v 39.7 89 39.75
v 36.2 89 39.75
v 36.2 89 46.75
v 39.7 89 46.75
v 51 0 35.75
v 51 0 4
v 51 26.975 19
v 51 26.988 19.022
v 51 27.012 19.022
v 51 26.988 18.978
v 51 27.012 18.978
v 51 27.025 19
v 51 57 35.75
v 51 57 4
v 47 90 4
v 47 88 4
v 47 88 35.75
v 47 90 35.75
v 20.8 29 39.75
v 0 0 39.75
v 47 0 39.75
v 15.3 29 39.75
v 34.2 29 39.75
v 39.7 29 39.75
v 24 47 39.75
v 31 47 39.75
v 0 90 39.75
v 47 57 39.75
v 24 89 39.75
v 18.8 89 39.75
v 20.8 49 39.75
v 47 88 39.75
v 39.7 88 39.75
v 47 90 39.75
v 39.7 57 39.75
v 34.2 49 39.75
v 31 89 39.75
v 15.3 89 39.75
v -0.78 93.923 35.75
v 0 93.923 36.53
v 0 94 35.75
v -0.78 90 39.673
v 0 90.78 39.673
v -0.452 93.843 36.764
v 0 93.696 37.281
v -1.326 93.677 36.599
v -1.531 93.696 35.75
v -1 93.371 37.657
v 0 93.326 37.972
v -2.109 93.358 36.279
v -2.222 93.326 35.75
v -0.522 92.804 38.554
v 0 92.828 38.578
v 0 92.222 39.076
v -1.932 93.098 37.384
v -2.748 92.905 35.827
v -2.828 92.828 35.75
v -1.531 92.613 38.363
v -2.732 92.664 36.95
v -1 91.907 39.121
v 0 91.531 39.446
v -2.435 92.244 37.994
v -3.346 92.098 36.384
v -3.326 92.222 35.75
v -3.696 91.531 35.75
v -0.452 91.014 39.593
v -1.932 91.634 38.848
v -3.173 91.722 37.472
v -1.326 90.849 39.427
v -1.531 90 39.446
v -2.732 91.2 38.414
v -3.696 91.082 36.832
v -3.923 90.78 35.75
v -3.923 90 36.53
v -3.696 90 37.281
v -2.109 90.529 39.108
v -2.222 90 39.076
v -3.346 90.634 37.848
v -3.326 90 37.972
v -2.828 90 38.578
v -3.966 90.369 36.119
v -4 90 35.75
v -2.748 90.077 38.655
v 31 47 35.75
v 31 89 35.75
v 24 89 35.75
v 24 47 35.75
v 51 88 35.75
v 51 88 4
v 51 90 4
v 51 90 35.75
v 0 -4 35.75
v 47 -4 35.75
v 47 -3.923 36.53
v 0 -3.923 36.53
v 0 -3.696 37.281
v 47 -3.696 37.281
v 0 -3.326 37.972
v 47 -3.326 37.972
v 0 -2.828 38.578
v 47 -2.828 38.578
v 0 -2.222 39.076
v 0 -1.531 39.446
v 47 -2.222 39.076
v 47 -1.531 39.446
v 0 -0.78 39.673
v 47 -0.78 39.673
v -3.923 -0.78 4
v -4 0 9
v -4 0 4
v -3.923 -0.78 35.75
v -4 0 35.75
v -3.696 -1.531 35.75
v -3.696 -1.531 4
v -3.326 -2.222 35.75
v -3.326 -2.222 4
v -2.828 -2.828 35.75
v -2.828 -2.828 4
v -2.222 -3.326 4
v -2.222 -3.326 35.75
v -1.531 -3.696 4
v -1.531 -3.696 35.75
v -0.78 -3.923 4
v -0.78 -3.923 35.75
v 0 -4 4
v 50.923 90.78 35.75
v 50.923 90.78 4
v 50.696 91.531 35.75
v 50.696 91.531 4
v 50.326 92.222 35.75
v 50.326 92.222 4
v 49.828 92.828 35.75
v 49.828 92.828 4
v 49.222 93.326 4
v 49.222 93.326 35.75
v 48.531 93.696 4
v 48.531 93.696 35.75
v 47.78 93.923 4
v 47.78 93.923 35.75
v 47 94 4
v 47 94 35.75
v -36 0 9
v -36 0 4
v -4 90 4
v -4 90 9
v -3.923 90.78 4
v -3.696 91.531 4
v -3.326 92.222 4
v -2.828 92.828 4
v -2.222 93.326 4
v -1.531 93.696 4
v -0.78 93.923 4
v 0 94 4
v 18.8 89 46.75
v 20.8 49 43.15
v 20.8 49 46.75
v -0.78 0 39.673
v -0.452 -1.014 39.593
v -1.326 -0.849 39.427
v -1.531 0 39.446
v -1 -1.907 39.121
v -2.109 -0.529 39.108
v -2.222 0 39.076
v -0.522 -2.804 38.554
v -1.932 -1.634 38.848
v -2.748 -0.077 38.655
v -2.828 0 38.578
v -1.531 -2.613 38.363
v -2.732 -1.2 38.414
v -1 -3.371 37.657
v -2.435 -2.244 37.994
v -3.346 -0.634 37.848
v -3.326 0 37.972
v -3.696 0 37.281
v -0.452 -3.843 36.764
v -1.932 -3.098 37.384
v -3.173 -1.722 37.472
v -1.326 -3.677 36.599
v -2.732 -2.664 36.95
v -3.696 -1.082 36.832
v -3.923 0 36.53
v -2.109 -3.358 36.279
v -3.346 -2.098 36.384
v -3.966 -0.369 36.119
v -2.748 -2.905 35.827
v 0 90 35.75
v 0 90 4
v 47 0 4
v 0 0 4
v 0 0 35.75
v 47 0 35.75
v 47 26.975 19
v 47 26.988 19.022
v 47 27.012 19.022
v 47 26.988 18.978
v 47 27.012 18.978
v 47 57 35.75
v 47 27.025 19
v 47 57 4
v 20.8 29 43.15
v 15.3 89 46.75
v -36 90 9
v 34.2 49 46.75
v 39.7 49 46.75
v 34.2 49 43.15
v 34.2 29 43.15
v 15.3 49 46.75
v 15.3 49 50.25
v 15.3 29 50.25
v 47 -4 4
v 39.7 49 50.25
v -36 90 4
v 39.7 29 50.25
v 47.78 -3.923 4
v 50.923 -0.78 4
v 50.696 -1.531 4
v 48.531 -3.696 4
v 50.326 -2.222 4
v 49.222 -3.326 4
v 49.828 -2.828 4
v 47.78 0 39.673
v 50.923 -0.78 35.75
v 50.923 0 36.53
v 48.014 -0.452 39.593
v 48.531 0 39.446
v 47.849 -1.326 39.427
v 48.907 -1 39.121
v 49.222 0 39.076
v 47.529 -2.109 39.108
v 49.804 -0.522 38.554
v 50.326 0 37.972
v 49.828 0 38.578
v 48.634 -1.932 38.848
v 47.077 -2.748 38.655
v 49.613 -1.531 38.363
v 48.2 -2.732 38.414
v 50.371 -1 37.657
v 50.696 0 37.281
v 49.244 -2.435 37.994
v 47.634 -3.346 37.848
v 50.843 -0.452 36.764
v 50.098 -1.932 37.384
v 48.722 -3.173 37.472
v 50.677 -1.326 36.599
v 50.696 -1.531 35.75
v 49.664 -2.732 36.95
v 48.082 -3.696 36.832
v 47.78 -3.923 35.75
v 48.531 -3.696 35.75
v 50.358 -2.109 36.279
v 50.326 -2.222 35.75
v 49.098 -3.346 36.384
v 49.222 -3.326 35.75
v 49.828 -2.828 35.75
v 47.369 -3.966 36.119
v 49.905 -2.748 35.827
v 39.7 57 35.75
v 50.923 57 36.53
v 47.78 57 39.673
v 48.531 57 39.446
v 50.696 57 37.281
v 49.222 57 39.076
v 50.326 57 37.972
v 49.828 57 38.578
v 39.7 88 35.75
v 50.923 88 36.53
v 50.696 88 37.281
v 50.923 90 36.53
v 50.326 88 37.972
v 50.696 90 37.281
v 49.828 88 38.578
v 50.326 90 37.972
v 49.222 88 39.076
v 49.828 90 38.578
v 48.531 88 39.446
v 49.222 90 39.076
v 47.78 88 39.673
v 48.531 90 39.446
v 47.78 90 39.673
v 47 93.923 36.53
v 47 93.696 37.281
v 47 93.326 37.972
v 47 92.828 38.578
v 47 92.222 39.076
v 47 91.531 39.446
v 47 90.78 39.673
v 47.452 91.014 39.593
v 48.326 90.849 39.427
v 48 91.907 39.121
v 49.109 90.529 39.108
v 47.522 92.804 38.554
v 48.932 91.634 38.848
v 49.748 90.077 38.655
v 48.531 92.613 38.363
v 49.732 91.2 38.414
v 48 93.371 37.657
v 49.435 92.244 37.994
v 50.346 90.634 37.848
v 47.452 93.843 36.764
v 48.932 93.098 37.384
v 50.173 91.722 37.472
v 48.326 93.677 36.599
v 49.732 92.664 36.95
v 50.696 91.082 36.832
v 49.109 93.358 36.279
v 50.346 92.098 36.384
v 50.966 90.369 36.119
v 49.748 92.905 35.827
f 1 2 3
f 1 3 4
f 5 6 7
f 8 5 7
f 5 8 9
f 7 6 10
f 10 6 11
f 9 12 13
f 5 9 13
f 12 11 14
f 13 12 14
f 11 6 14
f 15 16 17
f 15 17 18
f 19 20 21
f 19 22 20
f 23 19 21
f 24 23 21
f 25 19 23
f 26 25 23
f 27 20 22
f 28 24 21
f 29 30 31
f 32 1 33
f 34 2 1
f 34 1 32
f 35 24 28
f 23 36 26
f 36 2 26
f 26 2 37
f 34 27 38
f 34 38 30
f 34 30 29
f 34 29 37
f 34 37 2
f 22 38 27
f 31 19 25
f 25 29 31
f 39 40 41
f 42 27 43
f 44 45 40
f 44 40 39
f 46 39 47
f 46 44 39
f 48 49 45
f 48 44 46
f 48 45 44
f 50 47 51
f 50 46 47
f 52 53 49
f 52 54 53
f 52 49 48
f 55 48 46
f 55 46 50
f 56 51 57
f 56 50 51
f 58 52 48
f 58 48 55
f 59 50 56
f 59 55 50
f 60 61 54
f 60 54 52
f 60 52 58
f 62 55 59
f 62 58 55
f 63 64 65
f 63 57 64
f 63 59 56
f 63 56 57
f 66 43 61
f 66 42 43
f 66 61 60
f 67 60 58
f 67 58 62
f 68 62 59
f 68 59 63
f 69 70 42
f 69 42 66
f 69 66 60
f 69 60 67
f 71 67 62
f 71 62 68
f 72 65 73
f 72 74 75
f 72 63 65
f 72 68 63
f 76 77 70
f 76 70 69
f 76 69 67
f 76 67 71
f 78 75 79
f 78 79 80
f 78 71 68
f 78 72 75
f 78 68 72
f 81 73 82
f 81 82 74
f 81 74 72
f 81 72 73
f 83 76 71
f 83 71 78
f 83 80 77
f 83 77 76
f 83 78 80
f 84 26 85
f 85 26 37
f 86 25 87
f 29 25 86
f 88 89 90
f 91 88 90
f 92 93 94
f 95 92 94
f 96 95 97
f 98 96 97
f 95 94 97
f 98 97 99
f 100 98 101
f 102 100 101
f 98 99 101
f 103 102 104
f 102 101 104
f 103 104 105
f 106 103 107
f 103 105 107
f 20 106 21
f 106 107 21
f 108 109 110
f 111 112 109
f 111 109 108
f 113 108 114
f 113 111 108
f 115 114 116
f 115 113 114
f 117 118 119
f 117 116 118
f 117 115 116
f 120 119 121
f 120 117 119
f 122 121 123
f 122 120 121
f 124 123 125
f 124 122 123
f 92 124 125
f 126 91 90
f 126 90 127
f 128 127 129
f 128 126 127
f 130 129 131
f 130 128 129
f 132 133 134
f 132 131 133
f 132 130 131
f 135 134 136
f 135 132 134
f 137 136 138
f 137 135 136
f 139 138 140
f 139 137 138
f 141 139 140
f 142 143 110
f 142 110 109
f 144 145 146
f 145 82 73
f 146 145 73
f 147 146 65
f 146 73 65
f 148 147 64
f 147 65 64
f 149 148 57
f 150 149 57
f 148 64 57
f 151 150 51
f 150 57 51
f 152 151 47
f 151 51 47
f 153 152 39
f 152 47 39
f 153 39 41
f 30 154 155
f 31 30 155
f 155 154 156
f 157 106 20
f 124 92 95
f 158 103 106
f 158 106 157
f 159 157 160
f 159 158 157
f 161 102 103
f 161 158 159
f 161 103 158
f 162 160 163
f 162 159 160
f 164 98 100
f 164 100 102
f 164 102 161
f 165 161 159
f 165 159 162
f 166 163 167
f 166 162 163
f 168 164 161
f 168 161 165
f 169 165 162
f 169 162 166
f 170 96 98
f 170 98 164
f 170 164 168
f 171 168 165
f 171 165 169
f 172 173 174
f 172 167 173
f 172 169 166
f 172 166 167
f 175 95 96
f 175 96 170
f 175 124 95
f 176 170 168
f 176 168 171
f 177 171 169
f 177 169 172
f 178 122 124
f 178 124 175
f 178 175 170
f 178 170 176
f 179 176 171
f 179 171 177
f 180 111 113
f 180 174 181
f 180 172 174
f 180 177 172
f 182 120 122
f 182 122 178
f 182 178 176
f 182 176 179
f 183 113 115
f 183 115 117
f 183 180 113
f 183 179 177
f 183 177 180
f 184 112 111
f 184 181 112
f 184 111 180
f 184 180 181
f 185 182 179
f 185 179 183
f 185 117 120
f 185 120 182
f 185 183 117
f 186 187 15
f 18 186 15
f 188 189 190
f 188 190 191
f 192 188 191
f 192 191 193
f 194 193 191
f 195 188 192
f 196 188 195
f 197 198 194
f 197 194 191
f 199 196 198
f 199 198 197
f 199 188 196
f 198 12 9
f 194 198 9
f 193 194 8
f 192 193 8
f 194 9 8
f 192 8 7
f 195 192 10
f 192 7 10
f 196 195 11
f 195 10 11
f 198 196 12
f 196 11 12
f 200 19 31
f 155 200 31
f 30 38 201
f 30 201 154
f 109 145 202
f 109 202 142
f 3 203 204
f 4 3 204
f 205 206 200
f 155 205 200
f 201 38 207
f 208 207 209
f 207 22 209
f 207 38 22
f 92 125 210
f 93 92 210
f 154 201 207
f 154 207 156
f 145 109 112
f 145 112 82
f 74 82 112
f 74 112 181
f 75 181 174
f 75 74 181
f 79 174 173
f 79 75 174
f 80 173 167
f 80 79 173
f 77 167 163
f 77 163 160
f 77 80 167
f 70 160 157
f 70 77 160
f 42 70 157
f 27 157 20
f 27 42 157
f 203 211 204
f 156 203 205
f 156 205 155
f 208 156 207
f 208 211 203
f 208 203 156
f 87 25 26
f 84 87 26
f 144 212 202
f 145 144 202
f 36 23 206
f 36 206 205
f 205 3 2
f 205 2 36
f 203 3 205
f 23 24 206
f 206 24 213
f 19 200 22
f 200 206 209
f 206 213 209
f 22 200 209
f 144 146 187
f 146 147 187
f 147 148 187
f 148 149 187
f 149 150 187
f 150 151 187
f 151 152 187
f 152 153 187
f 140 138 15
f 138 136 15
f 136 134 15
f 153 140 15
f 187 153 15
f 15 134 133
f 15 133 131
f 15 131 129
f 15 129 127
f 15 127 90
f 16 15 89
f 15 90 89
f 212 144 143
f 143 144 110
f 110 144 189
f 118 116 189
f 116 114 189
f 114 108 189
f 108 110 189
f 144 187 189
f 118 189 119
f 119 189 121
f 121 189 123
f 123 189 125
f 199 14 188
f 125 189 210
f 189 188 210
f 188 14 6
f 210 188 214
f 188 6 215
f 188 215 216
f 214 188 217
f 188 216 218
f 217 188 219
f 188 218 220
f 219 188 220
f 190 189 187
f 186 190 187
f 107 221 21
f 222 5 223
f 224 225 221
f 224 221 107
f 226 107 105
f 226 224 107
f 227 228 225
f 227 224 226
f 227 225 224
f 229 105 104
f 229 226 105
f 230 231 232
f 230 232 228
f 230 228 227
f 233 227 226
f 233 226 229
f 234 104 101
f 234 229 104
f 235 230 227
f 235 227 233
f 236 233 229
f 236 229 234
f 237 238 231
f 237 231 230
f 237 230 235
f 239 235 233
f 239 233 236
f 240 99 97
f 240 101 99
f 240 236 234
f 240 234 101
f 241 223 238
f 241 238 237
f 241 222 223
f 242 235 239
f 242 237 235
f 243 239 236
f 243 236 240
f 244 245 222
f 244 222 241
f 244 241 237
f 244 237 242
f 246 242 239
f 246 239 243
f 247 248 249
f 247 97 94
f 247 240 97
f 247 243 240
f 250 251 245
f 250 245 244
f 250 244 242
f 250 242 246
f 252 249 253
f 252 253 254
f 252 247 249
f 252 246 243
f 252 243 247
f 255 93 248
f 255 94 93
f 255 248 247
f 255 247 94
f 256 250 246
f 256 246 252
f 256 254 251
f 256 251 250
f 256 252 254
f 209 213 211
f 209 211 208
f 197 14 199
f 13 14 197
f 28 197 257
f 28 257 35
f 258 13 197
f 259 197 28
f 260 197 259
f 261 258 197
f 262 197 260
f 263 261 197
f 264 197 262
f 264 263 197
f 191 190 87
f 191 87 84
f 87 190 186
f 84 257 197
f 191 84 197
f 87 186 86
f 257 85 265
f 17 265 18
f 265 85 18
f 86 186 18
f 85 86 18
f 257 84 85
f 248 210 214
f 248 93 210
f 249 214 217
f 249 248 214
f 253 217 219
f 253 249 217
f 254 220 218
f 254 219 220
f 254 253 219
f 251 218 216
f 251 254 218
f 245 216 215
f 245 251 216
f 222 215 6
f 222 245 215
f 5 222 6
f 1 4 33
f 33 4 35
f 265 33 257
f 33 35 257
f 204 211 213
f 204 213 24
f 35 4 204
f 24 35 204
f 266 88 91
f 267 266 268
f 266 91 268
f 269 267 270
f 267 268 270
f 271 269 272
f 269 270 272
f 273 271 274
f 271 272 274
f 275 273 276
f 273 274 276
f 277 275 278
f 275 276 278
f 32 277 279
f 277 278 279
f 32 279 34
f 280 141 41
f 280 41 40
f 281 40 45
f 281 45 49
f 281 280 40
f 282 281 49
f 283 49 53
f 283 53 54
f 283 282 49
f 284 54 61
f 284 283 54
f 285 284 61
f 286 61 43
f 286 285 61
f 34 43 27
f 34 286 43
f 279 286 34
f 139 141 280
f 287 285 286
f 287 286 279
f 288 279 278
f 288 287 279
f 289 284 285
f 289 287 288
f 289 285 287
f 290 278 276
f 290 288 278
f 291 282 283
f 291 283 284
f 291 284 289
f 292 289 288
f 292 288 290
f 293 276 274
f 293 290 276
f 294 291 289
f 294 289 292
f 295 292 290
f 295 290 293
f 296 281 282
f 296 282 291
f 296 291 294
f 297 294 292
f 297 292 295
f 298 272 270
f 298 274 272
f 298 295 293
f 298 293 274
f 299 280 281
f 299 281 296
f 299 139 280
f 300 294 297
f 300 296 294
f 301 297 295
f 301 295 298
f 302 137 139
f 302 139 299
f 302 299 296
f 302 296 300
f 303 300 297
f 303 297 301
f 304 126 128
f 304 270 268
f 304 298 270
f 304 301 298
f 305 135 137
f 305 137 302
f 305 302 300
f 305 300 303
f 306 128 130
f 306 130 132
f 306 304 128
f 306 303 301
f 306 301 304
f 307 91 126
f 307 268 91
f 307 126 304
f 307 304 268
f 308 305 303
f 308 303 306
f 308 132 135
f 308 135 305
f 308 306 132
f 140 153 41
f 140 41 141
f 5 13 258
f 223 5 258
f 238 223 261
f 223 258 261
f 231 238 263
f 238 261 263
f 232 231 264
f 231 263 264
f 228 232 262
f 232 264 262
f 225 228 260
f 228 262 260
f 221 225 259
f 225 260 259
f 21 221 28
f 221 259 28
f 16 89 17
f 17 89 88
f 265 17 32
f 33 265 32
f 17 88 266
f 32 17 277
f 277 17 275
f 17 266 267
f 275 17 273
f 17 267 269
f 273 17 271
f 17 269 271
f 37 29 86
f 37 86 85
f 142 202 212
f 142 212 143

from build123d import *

# Parameters (mm, degrees)
SKETCH_W        = 47
SKETCH_H        = 90
PAD_DEPTH       = 35.75
THICKNESS_T     = 4
SKETCH001_R     = 0.025
POCKET_DEPTH    = 5
SKETCH002_W     = 7
SKETCH002_H     = 42
POCKET001_DEPTH = 5
SKETCH003_W     = 5.5
SKETCH003_H     = 60
PAD001_DEPTH    = 7
PAD001_FACE4_W  = 90
PAD001_FACE4_H  = 47
POCKET002_DEPTH = 4
SKETCH004_W     = 31
SKETCH004_H     = 40
POCKET003_DEPTH = 11.3
SKETCH005_W     = 90
SKETCH005_H     = 5
PAD002_DEPTH    = 32
PAD003_DEPTH    = 20
POCKET004_DEPTH = 7


with BuildPart() as part:
    # Sketch → Pad (new body)
    with BuildSketch(Plane.XY):
        with Locations((23.5, 45)):
            Rectangle(SKETCH_W, SKETCH_H)
    extrude(amount=PAD_DEPTH)

    # Thickness
    thickness_openings = [part.faces().sort_by_distance(p)[0] for p in [
        (23.5, 45, 0),
    ]]
    offset(amount=THICKNESS_T, openings=thickness_openings)

    # Sketch001 (on Face10 of Thickness) → Pocket (cut)
    with BuildSketch(Plane.YZ.offset(51)):
        with Locations((27, 19)):
            Circle(SKETCH001_R)
    extrude(amount=-POCKET_DEPTH, mode=Mode.SUBTRACT)

    # Sketch002 (on Face24 of Pocket) → Pocket001 (cut)
    with BuildSketch(Plane.XY.offset(39.75)):
        with Locations((27.5, 68)):
            Rectangle(SKETCH002_W, SKETCH002_H)
    extrude(amount=-POCKET001_DEPTH, mode=Mode.SUBTRACT)

    # Sketch003 (on Face28 of Pocket001) → Pad001 (join)
    with BuildSketch(Plane.XY.offset(39.75)):
        with Locations((18.05, 59)):
            Rectangle(SKETCH003_W, SKETCH003_H)
        with Locations((36.95, 59)):
            Rectangle(SKETCH003_W, SKETCH003_H)
    extrude(amount=PAD001_DEPTH)

    # Pad001 Face4 → Pocket002 (cut)
    with BuildSketch(Plane(origin=(23.5, 45, 0), x_dir=(0, -1, 0), z_dir=(0, 0, -1))):
        with BuildLine():
            ThreePointArc((-45, 27.5), (-47.828427, 26.328427), (-49, 23.5))
            Line((-49, 23.5), (-49, -23.5))
            ThreePointArc((-49, -23.5), (-47.828427, -26.328427), (-45, -27.5))
            Line((-45, -27.5), (45, -27.5))
            ThreePointArc((45, -27.5), (47.828427, -26.328427), (49, -23.5))
            Line((49, -23.5), (49, 23.5))
            ThreePointArc((49, 23.5), (47.828427, 26.328427), (45, 27.5))
            Line((45, 27.5), (-45, 27.5))
        make_face()
        Rectangle(PAD001_FACE4_W, PAD001_FACE4_H, mode=Mode.SUBTRACT)
    extrude(amount=-POCKET002_DEPTH, mode=Mode.SUBTRACT)

    # Sketch004 (on Face12 of Pocket002) → Pocket003 (cut)
    with BuildSketch(Plane.YZ.offset(51)):
        with Locations((72.5, 24)):
            Rectangle(SKETCH004_W, SKETCH004_H)
    extrude(amount=-POCKET003_DEPTH, mode=Mode.SUBTRACT)

    # Sketch005 (on Face11 of Pocket003) → Pad002 (join)
    with BuildSketch(Plane(origin=(-4, 0, 0), x_dir=(0, -1, 0), z_dir=(-1, 0, 0))):
        with Locations((-45, 6.5)):
            Rectangle(SKETCH005_W, SKETCH005_H)
    extrude(amount=PAD002_DEPTH)

    # Sketch006 (on Face47 of Pad002) → Pad003 (join)
    with BuildSketch(Plane.XZ.offset(-29)):
        Polygon((15.3, 50.25), (34.2, 50.25), (39.7, 50.25), (39.7, 46.75), (34.2, 46.75), (34.2, 43.15), (15.3, 43.15), align=None)
    extrude(amount=-PAD003_DEPTH)

    # Sketch007 (on Face49 of Pad003) → Pocket004 (cut)
    with BuildSketch(Plane.XY.offset(46.75)):
        Polygon((20.8, 89), (18.8, 89), (20.8, 49), align=None)
        Polygon((34.2, 89), (36.2, 89), (34.2, 49), align=None)
    extrude(amount=-POCKET004_DEPTH, mode=Mode.SUBTRACT)


solid = part.part
